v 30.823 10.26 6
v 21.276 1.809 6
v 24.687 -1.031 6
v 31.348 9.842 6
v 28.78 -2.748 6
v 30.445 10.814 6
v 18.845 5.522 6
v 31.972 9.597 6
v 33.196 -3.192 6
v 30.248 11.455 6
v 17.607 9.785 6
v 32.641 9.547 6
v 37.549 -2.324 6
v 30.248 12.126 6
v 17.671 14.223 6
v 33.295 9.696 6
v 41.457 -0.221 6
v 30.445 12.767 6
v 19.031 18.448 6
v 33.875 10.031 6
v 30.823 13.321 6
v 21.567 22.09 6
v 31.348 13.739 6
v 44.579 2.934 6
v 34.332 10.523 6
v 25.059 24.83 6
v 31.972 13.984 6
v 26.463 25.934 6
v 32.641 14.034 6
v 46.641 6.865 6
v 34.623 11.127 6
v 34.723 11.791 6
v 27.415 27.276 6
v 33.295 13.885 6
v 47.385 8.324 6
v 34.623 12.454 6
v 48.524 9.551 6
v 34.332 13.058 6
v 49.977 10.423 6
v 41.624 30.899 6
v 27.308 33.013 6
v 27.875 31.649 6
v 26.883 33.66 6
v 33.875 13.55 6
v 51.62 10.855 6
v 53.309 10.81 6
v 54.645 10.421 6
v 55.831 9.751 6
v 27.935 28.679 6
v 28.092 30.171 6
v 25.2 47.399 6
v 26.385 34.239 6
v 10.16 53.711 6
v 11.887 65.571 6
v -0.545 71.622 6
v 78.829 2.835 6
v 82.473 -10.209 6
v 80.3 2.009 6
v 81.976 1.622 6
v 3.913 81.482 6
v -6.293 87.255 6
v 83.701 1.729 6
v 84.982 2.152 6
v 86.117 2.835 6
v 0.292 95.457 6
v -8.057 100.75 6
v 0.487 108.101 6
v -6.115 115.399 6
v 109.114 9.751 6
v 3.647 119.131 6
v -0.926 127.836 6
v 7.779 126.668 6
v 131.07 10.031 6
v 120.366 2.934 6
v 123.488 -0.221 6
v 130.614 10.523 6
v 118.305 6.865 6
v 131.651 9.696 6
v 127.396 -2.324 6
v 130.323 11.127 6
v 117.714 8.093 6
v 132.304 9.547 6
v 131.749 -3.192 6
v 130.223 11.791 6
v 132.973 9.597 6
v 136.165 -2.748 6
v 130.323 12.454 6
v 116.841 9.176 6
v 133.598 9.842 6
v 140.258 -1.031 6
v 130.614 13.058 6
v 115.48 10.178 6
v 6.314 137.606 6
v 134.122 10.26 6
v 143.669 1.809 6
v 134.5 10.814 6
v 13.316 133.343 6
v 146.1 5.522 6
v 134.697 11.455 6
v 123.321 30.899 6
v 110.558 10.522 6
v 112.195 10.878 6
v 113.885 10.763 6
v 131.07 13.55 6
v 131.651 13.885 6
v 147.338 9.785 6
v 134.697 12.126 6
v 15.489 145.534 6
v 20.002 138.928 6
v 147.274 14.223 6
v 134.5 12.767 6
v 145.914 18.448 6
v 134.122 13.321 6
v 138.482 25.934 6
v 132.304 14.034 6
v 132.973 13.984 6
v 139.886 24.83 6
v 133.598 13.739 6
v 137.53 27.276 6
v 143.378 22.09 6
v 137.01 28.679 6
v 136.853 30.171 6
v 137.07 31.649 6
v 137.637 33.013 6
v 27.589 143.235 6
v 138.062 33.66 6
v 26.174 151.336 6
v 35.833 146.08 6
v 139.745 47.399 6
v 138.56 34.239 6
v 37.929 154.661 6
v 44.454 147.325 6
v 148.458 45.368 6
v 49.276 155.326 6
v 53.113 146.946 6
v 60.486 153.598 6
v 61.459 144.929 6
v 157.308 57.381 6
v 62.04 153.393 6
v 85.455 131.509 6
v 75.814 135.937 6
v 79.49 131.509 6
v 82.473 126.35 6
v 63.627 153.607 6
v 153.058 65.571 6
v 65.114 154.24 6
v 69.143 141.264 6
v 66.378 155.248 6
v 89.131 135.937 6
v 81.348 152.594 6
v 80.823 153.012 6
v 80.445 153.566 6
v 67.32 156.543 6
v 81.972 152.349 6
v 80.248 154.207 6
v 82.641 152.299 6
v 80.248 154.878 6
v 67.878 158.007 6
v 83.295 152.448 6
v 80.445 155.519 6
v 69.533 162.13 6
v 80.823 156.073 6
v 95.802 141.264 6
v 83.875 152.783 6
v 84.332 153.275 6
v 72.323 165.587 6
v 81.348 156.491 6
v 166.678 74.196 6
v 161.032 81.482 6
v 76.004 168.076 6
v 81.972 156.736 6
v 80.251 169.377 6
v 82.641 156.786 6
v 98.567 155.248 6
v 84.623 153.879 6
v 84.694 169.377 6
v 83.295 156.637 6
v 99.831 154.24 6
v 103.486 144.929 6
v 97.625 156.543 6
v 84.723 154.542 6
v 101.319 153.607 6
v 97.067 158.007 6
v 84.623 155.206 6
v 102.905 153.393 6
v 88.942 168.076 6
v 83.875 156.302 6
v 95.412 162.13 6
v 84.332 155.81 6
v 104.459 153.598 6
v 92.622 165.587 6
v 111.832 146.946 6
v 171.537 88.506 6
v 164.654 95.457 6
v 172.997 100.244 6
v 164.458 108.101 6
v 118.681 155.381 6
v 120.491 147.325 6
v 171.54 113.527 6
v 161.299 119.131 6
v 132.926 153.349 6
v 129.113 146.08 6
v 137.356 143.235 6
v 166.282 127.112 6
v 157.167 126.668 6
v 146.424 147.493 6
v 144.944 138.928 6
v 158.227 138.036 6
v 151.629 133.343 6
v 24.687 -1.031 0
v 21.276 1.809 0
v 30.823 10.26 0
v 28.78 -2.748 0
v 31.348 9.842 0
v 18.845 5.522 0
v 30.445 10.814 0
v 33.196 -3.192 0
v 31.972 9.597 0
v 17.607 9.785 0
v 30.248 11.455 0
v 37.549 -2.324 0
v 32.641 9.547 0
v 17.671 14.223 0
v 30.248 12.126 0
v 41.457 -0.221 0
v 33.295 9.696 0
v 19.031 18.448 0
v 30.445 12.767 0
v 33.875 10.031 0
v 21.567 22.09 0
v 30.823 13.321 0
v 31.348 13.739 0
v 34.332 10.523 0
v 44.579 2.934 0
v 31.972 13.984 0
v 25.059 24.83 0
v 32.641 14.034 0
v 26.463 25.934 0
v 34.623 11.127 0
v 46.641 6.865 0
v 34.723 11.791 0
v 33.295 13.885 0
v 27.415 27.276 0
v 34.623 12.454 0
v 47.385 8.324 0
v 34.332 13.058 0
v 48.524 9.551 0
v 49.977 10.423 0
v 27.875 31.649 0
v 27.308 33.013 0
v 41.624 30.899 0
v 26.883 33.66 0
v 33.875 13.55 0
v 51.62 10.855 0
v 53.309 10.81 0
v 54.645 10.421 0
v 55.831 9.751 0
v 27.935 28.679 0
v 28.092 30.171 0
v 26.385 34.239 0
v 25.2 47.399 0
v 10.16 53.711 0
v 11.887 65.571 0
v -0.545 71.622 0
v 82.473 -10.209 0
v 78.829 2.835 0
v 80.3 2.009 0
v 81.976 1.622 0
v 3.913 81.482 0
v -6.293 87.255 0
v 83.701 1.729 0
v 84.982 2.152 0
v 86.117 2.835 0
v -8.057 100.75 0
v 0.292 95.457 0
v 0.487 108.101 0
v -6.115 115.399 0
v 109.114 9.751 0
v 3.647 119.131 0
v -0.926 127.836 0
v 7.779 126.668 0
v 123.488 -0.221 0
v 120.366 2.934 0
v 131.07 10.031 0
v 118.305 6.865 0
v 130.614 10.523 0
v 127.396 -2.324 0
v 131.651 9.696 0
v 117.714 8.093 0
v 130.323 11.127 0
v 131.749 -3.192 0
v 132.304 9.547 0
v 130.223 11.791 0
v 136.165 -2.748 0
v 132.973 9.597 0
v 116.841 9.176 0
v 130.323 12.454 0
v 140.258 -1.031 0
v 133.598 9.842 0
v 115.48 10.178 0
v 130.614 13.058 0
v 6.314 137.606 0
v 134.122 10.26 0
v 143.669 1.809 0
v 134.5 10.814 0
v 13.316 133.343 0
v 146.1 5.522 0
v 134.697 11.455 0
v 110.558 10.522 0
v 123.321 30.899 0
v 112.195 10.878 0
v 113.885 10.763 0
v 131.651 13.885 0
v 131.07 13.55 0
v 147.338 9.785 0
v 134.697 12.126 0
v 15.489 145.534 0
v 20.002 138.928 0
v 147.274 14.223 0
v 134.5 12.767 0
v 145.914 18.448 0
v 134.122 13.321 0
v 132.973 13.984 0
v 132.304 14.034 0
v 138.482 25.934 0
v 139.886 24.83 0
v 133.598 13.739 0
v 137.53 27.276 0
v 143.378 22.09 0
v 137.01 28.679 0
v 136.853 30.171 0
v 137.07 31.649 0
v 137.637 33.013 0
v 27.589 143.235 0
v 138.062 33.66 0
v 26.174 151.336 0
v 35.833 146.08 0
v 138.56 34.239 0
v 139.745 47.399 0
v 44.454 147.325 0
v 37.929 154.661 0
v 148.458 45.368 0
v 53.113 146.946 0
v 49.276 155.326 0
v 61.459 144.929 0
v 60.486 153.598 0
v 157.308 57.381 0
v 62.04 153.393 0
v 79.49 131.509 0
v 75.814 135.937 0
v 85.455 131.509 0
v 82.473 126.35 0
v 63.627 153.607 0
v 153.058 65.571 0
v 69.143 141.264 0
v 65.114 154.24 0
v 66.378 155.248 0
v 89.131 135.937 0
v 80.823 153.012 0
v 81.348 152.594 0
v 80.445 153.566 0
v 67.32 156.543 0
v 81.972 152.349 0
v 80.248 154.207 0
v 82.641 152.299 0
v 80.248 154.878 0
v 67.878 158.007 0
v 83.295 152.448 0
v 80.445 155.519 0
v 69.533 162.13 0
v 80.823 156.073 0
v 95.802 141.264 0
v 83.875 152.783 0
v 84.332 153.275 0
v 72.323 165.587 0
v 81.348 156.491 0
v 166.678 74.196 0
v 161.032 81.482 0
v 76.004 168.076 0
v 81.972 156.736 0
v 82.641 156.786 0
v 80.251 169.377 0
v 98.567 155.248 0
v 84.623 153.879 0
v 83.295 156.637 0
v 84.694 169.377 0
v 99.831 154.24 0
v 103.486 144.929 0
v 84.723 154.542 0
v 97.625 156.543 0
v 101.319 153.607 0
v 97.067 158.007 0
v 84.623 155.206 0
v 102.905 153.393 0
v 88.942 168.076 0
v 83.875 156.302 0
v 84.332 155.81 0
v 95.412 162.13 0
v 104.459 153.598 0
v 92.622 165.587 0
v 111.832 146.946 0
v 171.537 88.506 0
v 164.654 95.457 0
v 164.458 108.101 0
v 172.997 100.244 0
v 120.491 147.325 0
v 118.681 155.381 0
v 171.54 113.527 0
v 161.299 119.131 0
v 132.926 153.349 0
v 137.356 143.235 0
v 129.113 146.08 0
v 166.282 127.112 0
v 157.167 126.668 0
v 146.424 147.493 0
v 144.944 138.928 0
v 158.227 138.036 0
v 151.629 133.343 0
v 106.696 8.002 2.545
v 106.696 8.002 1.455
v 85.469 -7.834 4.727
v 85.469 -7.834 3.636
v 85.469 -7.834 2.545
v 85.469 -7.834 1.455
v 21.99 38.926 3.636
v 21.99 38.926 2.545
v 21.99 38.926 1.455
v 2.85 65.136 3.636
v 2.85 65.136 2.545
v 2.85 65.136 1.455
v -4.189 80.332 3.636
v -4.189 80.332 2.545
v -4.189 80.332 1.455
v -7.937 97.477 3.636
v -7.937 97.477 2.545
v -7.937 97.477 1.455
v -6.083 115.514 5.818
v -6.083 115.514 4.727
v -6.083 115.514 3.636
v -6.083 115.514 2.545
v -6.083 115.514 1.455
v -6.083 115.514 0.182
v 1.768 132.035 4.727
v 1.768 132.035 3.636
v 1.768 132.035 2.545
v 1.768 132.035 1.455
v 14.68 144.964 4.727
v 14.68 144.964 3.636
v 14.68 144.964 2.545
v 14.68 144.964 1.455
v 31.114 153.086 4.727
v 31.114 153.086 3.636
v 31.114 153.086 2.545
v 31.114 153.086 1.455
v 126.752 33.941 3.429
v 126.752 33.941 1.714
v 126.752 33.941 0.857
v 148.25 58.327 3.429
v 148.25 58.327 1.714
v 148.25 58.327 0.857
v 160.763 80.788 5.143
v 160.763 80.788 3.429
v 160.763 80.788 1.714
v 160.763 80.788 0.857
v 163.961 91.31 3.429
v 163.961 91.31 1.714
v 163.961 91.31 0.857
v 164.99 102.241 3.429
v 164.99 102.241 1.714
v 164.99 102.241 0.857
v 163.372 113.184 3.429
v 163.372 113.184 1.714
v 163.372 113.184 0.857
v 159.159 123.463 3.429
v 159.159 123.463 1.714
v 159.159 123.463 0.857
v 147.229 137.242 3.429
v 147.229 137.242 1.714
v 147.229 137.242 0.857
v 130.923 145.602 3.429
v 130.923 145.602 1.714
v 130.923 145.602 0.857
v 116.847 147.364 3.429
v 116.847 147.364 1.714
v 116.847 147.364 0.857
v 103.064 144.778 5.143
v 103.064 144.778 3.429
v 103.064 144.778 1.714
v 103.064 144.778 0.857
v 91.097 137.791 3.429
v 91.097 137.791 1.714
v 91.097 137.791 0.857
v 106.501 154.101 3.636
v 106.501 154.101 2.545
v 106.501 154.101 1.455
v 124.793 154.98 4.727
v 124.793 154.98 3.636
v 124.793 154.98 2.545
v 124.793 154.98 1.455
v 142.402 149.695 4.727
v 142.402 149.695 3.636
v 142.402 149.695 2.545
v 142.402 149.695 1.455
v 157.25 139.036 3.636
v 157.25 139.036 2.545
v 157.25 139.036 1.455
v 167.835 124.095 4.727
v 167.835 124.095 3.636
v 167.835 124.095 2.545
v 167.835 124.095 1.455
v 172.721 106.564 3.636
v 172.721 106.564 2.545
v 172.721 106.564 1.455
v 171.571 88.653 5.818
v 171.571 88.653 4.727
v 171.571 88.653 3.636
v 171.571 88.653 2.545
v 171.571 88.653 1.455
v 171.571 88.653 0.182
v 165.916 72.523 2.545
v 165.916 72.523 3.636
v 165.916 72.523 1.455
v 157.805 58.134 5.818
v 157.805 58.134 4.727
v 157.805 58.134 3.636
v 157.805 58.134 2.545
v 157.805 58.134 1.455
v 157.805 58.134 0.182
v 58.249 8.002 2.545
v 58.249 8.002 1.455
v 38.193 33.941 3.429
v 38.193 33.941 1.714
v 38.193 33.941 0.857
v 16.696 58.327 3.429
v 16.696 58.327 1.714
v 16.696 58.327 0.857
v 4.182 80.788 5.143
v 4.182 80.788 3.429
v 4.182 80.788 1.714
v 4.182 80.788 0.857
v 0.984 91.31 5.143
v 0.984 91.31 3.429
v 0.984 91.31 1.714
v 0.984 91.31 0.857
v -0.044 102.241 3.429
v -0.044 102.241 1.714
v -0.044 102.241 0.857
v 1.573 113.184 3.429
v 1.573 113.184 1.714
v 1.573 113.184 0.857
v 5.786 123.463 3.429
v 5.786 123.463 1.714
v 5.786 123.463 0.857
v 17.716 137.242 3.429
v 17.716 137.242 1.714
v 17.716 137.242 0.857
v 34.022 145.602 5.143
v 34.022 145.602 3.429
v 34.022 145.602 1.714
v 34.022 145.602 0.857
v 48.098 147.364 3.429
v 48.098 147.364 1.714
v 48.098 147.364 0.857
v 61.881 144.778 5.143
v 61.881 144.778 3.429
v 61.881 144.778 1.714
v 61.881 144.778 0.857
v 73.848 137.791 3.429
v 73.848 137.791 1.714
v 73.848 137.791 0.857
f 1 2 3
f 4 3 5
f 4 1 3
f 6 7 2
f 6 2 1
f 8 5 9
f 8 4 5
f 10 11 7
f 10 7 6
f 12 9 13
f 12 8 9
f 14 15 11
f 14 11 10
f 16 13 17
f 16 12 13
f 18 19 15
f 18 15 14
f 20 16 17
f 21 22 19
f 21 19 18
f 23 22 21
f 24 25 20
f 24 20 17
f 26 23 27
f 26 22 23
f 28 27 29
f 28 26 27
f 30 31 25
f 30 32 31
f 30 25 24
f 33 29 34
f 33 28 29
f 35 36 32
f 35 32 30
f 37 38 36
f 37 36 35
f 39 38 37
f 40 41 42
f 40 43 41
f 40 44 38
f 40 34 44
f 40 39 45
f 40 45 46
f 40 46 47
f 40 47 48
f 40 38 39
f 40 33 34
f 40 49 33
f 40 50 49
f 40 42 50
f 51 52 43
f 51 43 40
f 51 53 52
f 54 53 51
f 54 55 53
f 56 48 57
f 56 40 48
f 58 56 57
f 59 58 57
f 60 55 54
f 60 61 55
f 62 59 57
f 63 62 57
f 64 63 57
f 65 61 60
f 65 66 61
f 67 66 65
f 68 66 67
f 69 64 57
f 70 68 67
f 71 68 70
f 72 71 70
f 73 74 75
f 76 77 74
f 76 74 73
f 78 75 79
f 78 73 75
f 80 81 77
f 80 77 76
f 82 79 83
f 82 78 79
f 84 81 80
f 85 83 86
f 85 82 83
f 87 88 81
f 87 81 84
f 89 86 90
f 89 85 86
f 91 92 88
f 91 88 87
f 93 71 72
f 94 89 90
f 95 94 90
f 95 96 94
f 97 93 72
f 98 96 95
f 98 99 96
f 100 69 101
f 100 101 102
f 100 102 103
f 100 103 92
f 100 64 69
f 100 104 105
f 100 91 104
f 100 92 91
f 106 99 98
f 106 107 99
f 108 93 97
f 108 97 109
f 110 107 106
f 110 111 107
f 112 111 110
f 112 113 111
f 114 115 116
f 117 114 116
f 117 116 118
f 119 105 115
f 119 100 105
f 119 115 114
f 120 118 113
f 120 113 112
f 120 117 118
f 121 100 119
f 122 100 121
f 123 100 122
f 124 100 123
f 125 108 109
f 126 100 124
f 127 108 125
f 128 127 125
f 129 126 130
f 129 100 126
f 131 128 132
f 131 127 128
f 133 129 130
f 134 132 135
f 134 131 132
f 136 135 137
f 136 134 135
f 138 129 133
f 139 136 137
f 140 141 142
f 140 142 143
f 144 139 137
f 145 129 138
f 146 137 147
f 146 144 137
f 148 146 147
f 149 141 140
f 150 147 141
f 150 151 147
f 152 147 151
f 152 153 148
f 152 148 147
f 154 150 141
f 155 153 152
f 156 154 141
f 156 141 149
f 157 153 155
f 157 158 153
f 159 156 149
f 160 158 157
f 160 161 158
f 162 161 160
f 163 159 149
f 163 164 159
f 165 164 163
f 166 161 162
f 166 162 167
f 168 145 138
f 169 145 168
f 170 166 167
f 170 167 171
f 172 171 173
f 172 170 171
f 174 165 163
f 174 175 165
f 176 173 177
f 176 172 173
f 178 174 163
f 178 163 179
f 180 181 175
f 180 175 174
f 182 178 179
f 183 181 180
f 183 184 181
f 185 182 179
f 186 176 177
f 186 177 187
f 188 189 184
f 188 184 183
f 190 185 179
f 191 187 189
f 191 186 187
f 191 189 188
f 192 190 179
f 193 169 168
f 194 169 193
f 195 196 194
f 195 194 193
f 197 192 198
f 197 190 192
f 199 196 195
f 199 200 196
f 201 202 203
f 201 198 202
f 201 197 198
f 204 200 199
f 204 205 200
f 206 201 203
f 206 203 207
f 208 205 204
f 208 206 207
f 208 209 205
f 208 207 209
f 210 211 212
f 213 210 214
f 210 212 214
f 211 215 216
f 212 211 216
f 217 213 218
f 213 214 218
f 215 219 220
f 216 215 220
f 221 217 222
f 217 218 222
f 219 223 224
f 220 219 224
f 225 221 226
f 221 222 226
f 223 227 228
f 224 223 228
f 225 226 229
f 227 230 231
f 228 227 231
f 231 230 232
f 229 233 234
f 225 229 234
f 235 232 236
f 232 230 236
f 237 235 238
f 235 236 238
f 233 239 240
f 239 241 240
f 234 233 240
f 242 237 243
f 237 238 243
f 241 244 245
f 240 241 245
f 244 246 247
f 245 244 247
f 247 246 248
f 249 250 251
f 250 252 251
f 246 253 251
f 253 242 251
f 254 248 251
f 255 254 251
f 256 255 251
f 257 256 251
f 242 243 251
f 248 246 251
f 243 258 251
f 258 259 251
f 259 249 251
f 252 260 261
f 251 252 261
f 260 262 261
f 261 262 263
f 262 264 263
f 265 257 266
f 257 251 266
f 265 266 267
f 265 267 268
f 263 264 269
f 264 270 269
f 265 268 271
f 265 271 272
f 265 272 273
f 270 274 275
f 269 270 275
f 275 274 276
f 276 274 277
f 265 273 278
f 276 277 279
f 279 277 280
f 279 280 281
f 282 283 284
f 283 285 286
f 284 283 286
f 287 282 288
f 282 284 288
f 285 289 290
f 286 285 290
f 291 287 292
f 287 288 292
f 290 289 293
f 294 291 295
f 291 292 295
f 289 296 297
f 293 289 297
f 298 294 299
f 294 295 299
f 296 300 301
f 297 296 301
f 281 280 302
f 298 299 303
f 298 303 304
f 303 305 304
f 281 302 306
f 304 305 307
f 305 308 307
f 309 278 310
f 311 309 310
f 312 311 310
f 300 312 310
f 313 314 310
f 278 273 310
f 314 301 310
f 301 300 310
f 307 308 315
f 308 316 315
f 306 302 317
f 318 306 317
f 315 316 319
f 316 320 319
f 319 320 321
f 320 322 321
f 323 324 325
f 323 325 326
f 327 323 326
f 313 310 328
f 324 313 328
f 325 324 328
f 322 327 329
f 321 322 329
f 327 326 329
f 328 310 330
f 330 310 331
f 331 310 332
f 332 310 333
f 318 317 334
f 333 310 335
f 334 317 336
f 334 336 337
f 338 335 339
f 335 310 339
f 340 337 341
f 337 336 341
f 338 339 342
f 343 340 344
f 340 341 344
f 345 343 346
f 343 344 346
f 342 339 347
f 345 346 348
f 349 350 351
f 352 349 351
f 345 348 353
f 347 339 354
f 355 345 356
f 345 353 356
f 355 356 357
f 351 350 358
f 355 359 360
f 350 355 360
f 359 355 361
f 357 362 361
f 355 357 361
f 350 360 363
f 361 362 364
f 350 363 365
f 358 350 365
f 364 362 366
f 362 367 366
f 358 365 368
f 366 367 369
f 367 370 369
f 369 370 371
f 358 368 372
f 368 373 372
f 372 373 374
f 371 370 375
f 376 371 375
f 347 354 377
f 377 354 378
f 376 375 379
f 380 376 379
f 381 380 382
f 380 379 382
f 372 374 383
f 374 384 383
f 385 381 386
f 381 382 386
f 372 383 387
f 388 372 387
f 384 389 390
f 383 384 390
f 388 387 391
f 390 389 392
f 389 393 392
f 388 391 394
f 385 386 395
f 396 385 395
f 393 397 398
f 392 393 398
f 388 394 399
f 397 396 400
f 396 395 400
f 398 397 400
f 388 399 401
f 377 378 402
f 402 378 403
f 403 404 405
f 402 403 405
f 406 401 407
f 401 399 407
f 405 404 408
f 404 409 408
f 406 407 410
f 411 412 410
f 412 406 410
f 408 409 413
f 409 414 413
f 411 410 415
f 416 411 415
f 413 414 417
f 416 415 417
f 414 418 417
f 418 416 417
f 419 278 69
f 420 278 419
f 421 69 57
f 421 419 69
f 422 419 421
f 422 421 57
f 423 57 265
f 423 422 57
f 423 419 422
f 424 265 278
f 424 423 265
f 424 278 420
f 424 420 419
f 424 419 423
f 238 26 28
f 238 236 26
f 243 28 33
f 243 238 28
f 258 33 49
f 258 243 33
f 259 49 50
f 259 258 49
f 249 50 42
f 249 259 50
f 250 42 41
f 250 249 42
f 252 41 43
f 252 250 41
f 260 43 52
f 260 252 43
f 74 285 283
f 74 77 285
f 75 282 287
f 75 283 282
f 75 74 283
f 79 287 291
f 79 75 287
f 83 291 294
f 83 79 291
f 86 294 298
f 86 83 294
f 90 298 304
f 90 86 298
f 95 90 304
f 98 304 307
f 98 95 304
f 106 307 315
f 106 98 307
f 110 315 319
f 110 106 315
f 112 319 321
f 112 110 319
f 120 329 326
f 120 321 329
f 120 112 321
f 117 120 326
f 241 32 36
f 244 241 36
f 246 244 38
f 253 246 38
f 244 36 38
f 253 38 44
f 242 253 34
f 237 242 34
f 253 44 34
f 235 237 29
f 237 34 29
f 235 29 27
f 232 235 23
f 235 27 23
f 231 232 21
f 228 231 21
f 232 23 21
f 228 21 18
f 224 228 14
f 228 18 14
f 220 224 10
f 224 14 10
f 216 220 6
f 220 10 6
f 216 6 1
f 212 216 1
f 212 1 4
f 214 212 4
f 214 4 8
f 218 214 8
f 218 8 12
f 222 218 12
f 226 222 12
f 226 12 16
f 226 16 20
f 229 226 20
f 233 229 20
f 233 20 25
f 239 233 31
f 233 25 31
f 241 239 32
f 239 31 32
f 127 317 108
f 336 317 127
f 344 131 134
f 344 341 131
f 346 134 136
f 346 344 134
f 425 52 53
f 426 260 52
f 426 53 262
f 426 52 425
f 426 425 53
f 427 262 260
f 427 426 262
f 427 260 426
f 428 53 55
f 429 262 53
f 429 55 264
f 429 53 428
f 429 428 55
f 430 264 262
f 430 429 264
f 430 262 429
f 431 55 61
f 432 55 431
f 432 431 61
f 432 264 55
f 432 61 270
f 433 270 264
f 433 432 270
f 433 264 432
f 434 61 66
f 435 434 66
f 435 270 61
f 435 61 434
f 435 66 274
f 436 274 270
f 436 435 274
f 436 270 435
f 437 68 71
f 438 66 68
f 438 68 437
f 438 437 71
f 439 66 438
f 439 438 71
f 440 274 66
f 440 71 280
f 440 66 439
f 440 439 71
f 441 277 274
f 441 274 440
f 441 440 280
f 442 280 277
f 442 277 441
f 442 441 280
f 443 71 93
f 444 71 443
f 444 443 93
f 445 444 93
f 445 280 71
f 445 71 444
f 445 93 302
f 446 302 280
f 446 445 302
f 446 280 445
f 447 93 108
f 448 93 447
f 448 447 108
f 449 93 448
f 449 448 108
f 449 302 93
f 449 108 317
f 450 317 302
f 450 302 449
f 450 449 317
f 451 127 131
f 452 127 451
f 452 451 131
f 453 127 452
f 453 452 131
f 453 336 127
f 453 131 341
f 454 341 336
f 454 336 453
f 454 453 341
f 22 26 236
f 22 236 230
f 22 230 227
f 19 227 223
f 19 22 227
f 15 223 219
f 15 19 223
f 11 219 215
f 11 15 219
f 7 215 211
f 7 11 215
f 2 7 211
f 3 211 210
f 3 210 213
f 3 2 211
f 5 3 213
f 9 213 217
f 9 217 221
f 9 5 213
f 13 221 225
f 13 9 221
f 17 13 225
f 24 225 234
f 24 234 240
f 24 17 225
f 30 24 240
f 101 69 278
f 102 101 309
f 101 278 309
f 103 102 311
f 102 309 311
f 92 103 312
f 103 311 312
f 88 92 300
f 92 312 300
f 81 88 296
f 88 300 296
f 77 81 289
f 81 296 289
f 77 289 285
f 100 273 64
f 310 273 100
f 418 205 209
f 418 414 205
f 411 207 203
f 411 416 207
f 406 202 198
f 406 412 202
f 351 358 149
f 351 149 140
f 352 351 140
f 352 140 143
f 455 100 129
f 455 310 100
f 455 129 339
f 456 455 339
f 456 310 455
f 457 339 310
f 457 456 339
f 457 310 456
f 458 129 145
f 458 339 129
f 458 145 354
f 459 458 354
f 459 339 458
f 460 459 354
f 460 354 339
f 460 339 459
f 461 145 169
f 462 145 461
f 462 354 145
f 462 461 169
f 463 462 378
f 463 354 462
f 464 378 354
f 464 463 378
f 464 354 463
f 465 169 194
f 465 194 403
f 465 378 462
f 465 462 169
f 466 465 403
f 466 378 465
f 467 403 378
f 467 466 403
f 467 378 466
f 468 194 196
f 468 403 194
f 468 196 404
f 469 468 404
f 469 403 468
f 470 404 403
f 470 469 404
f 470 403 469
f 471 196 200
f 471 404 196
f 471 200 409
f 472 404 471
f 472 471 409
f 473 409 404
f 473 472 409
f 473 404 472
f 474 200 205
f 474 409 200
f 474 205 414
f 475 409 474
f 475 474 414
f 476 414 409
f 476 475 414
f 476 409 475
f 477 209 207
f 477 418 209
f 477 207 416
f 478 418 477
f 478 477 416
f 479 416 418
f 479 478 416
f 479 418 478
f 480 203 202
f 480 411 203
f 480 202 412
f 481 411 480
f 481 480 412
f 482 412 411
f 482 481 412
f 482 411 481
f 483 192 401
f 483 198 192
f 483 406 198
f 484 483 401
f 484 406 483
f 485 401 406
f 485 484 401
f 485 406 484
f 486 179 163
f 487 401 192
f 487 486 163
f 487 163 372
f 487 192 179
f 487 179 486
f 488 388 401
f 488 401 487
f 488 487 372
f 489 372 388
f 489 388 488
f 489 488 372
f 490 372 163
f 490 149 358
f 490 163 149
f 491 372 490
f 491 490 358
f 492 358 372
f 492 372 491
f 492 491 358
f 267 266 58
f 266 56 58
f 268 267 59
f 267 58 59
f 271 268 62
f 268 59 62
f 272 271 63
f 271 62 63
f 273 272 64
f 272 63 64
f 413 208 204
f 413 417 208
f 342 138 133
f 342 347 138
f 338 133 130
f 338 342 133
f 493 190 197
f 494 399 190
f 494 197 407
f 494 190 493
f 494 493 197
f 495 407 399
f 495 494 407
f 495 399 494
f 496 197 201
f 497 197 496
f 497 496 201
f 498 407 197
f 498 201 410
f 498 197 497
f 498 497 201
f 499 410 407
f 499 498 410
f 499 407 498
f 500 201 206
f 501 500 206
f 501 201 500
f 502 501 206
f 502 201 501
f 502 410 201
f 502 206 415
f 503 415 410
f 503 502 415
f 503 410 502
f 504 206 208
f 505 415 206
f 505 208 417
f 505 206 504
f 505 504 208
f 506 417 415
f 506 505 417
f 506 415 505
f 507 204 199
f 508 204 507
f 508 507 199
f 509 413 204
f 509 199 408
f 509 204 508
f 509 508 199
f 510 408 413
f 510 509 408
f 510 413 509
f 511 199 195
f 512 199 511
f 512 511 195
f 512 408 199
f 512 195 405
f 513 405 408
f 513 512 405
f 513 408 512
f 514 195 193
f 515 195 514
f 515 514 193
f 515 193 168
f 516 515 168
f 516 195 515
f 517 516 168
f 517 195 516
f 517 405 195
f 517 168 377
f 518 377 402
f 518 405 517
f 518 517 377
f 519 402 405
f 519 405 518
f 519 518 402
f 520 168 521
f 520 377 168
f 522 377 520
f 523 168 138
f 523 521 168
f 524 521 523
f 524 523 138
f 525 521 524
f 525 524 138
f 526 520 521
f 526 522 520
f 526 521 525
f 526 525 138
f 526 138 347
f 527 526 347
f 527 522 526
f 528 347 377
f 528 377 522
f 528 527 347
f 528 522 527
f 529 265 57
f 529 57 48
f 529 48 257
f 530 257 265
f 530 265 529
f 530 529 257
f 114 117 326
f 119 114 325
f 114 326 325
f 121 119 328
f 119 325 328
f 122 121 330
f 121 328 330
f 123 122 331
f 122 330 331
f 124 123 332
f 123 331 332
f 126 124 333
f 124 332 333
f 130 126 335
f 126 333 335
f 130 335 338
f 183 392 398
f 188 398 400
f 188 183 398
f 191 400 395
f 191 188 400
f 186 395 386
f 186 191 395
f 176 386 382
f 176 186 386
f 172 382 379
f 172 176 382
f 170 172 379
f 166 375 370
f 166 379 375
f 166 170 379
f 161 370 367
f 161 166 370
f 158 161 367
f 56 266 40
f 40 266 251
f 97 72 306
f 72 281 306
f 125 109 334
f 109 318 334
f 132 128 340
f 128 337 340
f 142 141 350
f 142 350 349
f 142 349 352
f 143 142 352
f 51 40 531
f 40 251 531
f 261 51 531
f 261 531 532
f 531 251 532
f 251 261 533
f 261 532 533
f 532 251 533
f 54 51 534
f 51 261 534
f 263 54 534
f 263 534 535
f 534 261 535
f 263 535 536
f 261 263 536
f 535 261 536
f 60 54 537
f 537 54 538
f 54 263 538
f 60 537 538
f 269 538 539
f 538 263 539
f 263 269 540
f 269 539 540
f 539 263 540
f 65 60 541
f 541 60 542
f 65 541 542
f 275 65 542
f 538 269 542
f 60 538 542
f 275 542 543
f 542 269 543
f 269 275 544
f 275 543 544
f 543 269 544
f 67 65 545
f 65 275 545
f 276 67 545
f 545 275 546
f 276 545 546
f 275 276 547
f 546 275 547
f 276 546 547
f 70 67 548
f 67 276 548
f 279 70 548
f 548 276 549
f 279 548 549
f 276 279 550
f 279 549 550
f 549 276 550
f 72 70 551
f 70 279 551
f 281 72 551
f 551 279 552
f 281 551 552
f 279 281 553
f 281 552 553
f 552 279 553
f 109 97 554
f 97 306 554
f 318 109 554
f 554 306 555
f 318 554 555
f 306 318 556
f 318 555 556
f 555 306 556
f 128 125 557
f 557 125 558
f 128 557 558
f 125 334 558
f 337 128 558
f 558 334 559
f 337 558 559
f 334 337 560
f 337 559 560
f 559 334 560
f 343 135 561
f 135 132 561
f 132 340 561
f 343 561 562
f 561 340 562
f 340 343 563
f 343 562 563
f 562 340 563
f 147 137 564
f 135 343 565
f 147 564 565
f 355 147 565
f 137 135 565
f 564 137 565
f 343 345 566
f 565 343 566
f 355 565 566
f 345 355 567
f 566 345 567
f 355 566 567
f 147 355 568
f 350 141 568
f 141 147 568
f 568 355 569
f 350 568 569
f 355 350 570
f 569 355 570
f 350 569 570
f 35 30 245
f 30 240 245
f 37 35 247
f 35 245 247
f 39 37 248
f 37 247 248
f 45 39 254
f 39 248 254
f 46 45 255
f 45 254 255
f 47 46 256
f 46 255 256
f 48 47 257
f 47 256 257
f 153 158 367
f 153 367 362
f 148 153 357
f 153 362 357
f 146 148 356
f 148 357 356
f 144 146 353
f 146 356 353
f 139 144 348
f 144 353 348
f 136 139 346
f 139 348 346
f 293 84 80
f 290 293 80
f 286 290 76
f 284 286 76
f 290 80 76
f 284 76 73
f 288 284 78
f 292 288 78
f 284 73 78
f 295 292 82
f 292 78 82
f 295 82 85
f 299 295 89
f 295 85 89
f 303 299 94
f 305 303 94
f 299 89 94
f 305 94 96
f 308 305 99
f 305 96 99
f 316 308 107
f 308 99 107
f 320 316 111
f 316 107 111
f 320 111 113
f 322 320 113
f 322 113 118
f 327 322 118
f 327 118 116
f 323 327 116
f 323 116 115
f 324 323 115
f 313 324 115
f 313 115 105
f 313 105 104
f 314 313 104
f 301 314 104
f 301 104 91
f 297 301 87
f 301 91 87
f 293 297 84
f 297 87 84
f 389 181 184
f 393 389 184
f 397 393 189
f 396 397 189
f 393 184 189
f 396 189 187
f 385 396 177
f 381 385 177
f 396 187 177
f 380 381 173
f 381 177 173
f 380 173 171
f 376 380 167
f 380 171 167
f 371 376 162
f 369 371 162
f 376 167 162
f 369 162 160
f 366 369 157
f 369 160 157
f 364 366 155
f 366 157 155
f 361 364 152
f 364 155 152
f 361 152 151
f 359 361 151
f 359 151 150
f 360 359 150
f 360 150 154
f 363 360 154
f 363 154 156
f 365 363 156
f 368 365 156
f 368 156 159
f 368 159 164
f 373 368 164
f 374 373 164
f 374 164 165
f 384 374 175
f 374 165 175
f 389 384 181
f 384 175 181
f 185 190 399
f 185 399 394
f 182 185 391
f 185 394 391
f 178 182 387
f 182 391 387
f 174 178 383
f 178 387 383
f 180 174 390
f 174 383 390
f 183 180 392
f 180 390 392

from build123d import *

# Parameters (mm, degrees)
BOSS_EXTRU_1_DEPTH = 6
ESQUISSE5_R        = 15
ESQUISSE5_R_2      = 2.25
BOSS_EXTRU_2_DEPTH = 6
CONG_1_R           = 6


with BuildPart() as part:
    # Esquisse4 → Boss.-Extru.1 (new body)
    with BuildSketch(Plane.XY):
        with BuildLine():
            add(Edge.make_bspline(
                [(82.472616095, -10.209400905), (81.473768233, -9.417456946), (79.980709865, -8.233833019), (77.969111672, -6.63849974), (76.02702582, -5.100393271), (73.579584991, -3.213319025), (69.587304059, -0.210302632), (64.491314394, 3.509119556), (56.180302528, 9.481838133), (45.653491001, 17.14469468), (35.326924258, 25.558682491), (27.502022229, 33.008783734), (20.085314738, 40.836407325), (13.270676045, 49.219363645), (7.085968127, 58.074252572), (2.770904447, 65.071966358), (-1.07084378, 72.455491772), (-4.31367616, 80.243721951), (-6.81075396, 88.562935857), (-8.195135533, 97.425235786), (-8.032438256, 106.596327776), (-6.330712291, 115.572236386), (-3.141408337, 124.198944653), (1.558030601, 132.199804754), (7.519100207, 139.212591542), (14.535168755, 145.163269137), (22.423138905, 149.916495524), (31.033243349, 153.34042103), (40.130468732, 155.238581256), (49.355880529, 155.582375027), (58.500420945, 154.36854218), (67.305388192, 151.550198602), (74.128909764, 147.801965869), (79.092575548, 143.947549858), (81.394634396, 141.713863229), (82.472616095, 140.542379671)],
                knots=[-0.025526634, -0.025526634, -0.025526634, -0.025526634, -0.010136609, -0.002441596, 0.005253416, 0.020643442, 0.036033467, 0.066813518, 0.097593568, 0.159153669, 0.220713771, 0.251493821, 0.282273872, 0.343833973, 0.374614024, 0.405394074, 0.436174125, 0.466954176, 0.497734226, 0.528514277, 0.559294327, 0.590074378, 0.620854429, 0.651634479, 0.68241453, 0.71319458, 0.743974631, 0.774754682, 0.805534732, 0.836314783, 0.867094834, 0.897874884, 0.928654935, 0.94404496, 0.959434985, 0.959434985, 0.959434985, 0.959434985], degree=3))
            add(Edge.make_bspline(
                [(82.472616095, 140.542379671), (83.550597794, 141.713863229), (85.852656642, 143.947549858), (90.816322426, 147.801965869), (97.639843998, 151.550198602), (106.444811245, 154.36854218), (115.589351662, 155.582375027), (124.814763458, 155.238581256), (133.911988842, 153.34042103), (142.522093285, 149.916495524), (150.410063436, 145.163269137), (157.426131984, 139.212591542), (163.387201589, 132.199804754), (168.086640528, 124.198944653), (171.275944481, 115.572236386), (172.977670446, 106.596327776), (173.140367724, 97.425235786), (171.755986151, 88.562935857), (169.25890835, 80.243721951), (166.01607597, 72.455491772), (162.174327743, 65.071966358), (157.859264063, 58.074252572), (151.674556145, 49.219363645), (144.859917452, 40.836407325), (137.443209961, 33.008783734), (129.618307932, 25.558682491), (119.291741189, 17.14469468), (108.764929662, 9.481838133), (100.453917796, 3.509119556), (95.357928131, -0.210302632), (91.3656472, -3.213319025), (88.91820637, -5.100393271), (86.976120518, -6.63849974), (84.964522325, -8.233833019), (83.471463957, -9.417456946), (82.472616095, -10.209400905)],
                knots=[-0.025526634, -0.025526634, -0.025526634, -0.025526634, -0.010136609, 0.005253416, 0.036033467, 0.066813518, 0.097593568, 0.128373619, 0.159153669, 0.18993372, 0.220713771, 0.251493821, 0.282273872, 0.313053922, 0.343833973, 0.374614024, 0.405394074, 0.436174125, 0.466954176, 0.497734226, 0.528514277, 0.559294327, 0.590074378, 0.651634479, 0.68241453, 0.71319458, 0.774754682, 0.836314783, 0.867094834, 0.897874884, 0.913264909, 0.928654935, 0.936349947, 0.94404496, 0.959434985, 0.959434985, 0.959434985, 0.959434985], degree=3))
        make_face()
        with BuildLine():
            add(Edge.make_bspline(
                [(82.472616095, 0), (97.001365121, 11.519226751), (122.36751101, 27.159664528), (147.664455446, 55.947352529), (160.776944752, 78.107581553), (166.836954822, 100.903984809), (160.564003733, 128.294665653), (126.577250321, 154.854375307), (91.066621187, 144.596317398), (82.472616095, 126.350308344)],
                knots=[0, 0, 0, 0, 0.223855728, 0.35428141, 0.457435149, 0.531451174, 0.633256174, 0.777210755, 1, 1, 1, 1], degree=3))
            add(Edge.make_bspline(
                [(82.472616095, 0), (67.943867069, 11.519226751), (42.57772118, 27.159664528), (17.280776744, 55.947352529), (4.168287438, 78.107581553), (-1.891722631, 100.903984809), (4.381228457, 128.294665653), (38.367981869, 154.854375307), (73.878611003, 144.596317398), (82.472616095, 126.350308344)],
                knots=[0, 0, 0, 0, 0.223855728, 0.35428141, 0.457435149, 0.531451174, 0.633256174, 0.777210755, 1, 1, 1, 1], degree=3))
        make_face(mode=Mode.SUBTRACT)
    extrude(amount=BOSS_EXTRU_1_DEPTH)

    # Esquisse5 → Boss.-Extru.2 (add)
    # profile 1 of 3: a face of its own
    with BuildSketch(Plane.XY.offset(6)):
        with Locations((32.472616095, 11.790599095)):
            Circle(ESQUISSE5_R)
        with Locations((32.472616095, 11.790599095)):
            Circle(ESQUISSE5_R_2, mode=Mode.SUBTRACT)
    # profile 2 of 3: a face of its own
    with BuildSketch(Plane.XY.offset(6)):
        with Locations((132.472616095, 11.790599095)):
            Circle(ESQUISSE5_R)
        with Locations(Location((132.472616095, 11.790599095, 0), (0, 0, 180))):
            Circle(ESQUISSE5_R_2, mode=Mode.SUBTRACT)
    # profile 3 of 3: a face of its own
    with BuildSketch(Plane.XY.offset(6)):
        with Locations((82.472616095, 154.542379671)):
            Circle(ESQUISSE5_R)
        with Locations((82.472616095, 154.542379671)):
            Circle(ESQUISSE5_R_2, mode=Mode.SUBTRACT)
    extrude(amount=-BOSS_EXTRU_2_DEPTH)

    # Congé1
    cong_1_edges = [part.edges().sort_by_distance(p)[0] for p in [
        (82.472616095, 0, 3),
        (67.906565982, 150.960455033, 3),
        (97.038666208, 150.960455033, 3),
        (118.236219943, 16.515535559, 3),
        (130.644527221, 26.678785387, 3),
        (34.300704969, 26.678785387, 3),
        (46.709012248, 16.515535559, 3),
    ]]
    fillet(cong_1_edges, radius=CONG_1_R)


solid = part.part
